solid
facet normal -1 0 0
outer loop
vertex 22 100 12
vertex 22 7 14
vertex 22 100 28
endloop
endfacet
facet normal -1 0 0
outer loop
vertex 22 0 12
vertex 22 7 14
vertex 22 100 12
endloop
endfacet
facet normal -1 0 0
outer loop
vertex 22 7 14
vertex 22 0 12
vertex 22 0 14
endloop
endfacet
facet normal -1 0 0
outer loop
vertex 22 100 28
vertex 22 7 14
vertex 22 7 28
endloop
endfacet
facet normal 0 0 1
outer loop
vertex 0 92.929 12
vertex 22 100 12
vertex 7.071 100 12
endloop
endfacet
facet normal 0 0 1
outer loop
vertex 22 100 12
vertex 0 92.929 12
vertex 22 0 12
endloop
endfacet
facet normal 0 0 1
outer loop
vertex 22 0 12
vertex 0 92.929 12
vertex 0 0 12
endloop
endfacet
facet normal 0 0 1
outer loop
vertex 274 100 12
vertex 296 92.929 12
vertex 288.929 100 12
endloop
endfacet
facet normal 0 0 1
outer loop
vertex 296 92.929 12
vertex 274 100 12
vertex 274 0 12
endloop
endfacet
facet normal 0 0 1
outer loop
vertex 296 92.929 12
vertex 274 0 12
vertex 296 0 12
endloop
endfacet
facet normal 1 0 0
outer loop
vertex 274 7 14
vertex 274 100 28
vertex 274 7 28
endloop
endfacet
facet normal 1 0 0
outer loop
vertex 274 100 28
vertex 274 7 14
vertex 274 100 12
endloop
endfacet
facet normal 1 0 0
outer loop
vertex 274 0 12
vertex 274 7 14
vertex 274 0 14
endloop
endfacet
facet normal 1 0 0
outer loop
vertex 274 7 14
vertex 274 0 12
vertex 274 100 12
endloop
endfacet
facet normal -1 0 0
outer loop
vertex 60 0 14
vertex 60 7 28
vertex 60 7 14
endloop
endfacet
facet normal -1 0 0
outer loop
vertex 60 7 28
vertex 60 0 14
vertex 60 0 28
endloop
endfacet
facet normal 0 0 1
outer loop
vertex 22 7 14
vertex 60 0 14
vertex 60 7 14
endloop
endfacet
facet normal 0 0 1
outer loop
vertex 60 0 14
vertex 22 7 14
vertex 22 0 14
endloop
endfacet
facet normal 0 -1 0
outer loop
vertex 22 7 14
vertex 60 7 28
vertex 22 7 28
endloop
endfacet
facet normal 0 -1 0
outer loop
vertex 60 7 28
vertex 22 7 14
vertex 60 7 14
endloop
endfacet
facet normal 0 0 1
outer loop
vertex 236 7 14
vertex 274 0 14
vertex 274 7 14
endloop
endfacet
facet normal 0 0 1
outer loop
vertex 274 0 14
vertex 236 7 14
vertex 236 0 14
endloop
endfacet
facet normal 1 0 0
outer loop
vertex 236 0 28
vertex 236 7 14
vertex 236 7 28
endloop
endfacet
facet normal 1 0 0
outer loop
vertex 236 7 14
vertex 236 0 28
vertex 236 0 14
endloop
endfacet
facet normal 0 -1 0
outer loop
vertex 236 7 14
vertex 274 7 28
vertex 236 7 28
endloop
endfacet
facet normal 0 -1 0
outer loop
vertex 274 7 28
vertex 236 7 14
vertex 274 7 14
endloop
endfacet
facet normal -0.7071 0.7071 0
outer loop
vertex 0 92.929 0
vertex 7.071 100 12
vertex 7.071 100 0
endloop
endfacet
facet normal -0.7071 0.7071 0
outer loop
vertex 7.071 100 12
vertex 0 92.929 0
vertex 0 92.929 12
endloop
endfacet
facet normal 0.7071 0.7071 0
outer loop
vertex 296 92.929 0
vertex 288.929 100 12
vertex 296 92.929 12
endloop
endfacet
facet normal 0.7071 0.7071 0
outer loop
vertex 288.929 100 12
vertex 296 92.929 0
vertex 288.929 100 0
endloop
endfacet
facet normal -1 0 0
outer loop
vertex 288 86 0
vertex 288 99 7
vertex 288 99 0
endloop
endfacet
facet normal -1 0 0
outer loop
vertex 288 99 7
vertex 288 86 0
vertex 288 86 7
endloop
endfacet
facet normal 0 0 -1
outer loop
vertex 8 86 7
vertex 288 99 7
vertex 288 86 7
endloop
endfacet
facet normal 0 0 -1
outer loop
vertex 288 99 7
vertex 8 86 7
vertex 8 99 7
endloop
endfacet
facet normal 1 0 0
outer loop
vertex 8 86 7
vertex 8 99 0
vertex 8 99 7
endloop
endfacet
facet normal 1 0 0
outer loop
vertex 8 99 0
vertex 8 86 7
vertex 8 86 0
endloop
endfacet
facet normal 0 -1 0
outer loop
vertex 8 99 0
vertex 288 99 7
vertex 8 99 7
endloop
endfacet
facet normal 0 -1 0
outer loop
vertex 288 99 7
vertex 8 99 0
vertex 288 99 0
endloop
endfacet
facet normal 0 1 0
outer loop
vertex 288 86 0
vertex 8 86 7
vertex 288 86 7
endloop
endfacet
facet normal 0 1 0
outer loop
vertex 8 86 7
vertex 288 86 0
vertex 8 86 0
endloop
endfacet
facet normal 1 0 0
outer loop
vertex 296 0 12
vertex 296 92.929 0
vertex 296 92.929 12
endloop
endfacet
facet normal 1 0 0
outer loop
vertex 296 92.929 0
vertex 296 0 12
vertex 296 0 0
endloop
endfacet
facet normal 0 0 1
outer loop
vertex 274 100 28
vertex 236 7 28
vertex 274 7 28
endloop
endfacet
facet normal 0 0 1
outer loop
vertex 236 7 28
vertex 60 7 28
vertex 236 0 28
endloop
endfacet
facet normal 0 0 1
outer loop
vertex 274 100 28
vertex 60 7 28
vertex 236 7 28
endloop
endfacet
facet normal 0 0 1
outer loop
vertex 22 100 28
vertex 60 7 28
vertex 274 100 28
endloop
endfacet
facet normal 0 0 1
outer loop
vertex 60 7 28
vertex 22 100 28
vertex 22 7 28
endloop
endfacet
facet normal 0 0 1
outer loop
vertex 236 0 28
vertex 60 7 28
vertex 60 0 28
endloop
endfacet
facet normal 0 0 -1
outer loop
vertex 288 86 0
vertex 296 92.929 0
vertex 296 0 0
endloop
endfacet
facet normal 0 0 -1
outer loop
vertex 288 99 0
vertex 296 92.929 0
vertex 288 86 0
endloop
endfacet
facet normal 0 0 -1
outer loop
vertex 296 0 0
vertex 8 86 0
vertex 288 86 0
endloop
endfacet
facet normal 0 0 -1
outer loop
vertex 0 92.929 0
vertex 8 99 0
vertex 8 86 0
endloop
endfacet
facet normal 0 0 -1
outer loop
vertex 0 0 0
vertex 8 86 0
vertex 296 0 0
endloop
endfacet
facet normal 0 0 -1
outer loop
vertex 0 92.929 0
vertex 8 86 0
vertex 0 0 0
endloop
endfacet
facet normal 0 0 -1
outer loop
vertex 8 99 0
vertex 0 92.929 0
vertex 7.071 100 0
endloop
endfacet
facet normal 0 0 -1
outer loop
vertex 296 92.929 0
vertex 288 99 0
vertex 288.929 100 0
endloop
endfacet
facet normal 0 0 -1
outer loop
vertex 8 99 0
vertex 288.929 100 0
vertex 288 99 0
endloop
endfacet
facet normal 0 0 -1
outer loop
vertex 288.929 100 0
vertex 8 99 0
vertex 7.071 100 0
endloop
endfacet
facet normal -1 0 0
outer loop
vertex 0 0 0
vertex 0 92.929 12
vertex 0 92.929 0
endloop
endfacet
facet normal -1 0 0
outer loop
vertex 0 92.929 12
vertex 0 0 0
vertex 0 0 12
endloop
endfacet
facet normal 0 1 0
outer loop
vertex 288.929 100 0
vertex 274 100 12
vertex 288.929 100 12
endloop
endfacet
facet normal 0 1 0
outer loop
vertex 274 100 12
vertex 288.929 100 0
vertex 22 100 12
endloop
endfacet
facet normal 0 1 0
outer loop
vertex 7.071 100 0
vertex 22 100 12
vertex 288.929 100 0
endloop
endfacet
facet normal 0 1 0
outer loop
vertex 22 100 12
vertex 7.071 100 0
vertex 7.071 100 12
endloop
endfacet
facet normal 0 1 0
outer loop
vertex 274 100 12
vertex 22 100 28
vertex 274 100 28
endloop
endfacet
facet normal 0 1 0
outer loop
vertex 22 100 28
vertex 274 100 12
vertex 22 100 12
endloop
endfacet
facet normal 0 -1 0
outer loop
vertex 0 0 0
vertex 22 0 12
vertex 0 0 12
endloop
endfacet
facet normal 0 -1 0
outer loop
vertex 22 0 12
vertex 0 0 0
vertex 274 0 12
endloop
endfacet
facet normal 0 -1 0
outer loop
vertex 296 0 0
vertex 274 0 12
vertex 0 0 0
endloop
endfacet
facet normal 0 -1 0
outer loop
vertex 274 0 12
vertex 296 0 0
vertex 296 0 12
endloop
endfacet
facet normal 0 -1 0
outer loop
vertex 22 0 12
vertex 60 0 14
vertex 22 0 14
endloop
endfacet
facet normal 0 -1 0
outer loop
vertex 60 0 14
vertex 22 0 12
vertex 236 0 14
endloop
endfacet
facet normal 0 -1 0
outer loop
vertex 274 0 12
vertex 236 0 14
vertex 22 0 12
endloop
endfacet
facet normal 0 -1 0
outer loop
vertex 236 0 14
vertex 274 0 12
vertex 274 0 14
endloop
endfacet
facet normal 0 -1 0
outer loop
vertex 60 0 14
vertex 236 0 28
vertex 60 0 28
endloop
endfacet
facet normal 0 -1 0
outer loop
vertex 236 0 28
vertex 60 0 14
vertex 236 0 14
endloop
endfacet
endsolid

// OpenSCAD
include <../src/wardrobe.scad>;
plank_yx_side_top();
//github_openscad -o wardrobe_3/plank_yx_side_top.stl -D wardrobe_n=3 -D cutting_edge=0 -D break_view_length=0 wardrobe_3/plank_yx_side_top_stl.scad
